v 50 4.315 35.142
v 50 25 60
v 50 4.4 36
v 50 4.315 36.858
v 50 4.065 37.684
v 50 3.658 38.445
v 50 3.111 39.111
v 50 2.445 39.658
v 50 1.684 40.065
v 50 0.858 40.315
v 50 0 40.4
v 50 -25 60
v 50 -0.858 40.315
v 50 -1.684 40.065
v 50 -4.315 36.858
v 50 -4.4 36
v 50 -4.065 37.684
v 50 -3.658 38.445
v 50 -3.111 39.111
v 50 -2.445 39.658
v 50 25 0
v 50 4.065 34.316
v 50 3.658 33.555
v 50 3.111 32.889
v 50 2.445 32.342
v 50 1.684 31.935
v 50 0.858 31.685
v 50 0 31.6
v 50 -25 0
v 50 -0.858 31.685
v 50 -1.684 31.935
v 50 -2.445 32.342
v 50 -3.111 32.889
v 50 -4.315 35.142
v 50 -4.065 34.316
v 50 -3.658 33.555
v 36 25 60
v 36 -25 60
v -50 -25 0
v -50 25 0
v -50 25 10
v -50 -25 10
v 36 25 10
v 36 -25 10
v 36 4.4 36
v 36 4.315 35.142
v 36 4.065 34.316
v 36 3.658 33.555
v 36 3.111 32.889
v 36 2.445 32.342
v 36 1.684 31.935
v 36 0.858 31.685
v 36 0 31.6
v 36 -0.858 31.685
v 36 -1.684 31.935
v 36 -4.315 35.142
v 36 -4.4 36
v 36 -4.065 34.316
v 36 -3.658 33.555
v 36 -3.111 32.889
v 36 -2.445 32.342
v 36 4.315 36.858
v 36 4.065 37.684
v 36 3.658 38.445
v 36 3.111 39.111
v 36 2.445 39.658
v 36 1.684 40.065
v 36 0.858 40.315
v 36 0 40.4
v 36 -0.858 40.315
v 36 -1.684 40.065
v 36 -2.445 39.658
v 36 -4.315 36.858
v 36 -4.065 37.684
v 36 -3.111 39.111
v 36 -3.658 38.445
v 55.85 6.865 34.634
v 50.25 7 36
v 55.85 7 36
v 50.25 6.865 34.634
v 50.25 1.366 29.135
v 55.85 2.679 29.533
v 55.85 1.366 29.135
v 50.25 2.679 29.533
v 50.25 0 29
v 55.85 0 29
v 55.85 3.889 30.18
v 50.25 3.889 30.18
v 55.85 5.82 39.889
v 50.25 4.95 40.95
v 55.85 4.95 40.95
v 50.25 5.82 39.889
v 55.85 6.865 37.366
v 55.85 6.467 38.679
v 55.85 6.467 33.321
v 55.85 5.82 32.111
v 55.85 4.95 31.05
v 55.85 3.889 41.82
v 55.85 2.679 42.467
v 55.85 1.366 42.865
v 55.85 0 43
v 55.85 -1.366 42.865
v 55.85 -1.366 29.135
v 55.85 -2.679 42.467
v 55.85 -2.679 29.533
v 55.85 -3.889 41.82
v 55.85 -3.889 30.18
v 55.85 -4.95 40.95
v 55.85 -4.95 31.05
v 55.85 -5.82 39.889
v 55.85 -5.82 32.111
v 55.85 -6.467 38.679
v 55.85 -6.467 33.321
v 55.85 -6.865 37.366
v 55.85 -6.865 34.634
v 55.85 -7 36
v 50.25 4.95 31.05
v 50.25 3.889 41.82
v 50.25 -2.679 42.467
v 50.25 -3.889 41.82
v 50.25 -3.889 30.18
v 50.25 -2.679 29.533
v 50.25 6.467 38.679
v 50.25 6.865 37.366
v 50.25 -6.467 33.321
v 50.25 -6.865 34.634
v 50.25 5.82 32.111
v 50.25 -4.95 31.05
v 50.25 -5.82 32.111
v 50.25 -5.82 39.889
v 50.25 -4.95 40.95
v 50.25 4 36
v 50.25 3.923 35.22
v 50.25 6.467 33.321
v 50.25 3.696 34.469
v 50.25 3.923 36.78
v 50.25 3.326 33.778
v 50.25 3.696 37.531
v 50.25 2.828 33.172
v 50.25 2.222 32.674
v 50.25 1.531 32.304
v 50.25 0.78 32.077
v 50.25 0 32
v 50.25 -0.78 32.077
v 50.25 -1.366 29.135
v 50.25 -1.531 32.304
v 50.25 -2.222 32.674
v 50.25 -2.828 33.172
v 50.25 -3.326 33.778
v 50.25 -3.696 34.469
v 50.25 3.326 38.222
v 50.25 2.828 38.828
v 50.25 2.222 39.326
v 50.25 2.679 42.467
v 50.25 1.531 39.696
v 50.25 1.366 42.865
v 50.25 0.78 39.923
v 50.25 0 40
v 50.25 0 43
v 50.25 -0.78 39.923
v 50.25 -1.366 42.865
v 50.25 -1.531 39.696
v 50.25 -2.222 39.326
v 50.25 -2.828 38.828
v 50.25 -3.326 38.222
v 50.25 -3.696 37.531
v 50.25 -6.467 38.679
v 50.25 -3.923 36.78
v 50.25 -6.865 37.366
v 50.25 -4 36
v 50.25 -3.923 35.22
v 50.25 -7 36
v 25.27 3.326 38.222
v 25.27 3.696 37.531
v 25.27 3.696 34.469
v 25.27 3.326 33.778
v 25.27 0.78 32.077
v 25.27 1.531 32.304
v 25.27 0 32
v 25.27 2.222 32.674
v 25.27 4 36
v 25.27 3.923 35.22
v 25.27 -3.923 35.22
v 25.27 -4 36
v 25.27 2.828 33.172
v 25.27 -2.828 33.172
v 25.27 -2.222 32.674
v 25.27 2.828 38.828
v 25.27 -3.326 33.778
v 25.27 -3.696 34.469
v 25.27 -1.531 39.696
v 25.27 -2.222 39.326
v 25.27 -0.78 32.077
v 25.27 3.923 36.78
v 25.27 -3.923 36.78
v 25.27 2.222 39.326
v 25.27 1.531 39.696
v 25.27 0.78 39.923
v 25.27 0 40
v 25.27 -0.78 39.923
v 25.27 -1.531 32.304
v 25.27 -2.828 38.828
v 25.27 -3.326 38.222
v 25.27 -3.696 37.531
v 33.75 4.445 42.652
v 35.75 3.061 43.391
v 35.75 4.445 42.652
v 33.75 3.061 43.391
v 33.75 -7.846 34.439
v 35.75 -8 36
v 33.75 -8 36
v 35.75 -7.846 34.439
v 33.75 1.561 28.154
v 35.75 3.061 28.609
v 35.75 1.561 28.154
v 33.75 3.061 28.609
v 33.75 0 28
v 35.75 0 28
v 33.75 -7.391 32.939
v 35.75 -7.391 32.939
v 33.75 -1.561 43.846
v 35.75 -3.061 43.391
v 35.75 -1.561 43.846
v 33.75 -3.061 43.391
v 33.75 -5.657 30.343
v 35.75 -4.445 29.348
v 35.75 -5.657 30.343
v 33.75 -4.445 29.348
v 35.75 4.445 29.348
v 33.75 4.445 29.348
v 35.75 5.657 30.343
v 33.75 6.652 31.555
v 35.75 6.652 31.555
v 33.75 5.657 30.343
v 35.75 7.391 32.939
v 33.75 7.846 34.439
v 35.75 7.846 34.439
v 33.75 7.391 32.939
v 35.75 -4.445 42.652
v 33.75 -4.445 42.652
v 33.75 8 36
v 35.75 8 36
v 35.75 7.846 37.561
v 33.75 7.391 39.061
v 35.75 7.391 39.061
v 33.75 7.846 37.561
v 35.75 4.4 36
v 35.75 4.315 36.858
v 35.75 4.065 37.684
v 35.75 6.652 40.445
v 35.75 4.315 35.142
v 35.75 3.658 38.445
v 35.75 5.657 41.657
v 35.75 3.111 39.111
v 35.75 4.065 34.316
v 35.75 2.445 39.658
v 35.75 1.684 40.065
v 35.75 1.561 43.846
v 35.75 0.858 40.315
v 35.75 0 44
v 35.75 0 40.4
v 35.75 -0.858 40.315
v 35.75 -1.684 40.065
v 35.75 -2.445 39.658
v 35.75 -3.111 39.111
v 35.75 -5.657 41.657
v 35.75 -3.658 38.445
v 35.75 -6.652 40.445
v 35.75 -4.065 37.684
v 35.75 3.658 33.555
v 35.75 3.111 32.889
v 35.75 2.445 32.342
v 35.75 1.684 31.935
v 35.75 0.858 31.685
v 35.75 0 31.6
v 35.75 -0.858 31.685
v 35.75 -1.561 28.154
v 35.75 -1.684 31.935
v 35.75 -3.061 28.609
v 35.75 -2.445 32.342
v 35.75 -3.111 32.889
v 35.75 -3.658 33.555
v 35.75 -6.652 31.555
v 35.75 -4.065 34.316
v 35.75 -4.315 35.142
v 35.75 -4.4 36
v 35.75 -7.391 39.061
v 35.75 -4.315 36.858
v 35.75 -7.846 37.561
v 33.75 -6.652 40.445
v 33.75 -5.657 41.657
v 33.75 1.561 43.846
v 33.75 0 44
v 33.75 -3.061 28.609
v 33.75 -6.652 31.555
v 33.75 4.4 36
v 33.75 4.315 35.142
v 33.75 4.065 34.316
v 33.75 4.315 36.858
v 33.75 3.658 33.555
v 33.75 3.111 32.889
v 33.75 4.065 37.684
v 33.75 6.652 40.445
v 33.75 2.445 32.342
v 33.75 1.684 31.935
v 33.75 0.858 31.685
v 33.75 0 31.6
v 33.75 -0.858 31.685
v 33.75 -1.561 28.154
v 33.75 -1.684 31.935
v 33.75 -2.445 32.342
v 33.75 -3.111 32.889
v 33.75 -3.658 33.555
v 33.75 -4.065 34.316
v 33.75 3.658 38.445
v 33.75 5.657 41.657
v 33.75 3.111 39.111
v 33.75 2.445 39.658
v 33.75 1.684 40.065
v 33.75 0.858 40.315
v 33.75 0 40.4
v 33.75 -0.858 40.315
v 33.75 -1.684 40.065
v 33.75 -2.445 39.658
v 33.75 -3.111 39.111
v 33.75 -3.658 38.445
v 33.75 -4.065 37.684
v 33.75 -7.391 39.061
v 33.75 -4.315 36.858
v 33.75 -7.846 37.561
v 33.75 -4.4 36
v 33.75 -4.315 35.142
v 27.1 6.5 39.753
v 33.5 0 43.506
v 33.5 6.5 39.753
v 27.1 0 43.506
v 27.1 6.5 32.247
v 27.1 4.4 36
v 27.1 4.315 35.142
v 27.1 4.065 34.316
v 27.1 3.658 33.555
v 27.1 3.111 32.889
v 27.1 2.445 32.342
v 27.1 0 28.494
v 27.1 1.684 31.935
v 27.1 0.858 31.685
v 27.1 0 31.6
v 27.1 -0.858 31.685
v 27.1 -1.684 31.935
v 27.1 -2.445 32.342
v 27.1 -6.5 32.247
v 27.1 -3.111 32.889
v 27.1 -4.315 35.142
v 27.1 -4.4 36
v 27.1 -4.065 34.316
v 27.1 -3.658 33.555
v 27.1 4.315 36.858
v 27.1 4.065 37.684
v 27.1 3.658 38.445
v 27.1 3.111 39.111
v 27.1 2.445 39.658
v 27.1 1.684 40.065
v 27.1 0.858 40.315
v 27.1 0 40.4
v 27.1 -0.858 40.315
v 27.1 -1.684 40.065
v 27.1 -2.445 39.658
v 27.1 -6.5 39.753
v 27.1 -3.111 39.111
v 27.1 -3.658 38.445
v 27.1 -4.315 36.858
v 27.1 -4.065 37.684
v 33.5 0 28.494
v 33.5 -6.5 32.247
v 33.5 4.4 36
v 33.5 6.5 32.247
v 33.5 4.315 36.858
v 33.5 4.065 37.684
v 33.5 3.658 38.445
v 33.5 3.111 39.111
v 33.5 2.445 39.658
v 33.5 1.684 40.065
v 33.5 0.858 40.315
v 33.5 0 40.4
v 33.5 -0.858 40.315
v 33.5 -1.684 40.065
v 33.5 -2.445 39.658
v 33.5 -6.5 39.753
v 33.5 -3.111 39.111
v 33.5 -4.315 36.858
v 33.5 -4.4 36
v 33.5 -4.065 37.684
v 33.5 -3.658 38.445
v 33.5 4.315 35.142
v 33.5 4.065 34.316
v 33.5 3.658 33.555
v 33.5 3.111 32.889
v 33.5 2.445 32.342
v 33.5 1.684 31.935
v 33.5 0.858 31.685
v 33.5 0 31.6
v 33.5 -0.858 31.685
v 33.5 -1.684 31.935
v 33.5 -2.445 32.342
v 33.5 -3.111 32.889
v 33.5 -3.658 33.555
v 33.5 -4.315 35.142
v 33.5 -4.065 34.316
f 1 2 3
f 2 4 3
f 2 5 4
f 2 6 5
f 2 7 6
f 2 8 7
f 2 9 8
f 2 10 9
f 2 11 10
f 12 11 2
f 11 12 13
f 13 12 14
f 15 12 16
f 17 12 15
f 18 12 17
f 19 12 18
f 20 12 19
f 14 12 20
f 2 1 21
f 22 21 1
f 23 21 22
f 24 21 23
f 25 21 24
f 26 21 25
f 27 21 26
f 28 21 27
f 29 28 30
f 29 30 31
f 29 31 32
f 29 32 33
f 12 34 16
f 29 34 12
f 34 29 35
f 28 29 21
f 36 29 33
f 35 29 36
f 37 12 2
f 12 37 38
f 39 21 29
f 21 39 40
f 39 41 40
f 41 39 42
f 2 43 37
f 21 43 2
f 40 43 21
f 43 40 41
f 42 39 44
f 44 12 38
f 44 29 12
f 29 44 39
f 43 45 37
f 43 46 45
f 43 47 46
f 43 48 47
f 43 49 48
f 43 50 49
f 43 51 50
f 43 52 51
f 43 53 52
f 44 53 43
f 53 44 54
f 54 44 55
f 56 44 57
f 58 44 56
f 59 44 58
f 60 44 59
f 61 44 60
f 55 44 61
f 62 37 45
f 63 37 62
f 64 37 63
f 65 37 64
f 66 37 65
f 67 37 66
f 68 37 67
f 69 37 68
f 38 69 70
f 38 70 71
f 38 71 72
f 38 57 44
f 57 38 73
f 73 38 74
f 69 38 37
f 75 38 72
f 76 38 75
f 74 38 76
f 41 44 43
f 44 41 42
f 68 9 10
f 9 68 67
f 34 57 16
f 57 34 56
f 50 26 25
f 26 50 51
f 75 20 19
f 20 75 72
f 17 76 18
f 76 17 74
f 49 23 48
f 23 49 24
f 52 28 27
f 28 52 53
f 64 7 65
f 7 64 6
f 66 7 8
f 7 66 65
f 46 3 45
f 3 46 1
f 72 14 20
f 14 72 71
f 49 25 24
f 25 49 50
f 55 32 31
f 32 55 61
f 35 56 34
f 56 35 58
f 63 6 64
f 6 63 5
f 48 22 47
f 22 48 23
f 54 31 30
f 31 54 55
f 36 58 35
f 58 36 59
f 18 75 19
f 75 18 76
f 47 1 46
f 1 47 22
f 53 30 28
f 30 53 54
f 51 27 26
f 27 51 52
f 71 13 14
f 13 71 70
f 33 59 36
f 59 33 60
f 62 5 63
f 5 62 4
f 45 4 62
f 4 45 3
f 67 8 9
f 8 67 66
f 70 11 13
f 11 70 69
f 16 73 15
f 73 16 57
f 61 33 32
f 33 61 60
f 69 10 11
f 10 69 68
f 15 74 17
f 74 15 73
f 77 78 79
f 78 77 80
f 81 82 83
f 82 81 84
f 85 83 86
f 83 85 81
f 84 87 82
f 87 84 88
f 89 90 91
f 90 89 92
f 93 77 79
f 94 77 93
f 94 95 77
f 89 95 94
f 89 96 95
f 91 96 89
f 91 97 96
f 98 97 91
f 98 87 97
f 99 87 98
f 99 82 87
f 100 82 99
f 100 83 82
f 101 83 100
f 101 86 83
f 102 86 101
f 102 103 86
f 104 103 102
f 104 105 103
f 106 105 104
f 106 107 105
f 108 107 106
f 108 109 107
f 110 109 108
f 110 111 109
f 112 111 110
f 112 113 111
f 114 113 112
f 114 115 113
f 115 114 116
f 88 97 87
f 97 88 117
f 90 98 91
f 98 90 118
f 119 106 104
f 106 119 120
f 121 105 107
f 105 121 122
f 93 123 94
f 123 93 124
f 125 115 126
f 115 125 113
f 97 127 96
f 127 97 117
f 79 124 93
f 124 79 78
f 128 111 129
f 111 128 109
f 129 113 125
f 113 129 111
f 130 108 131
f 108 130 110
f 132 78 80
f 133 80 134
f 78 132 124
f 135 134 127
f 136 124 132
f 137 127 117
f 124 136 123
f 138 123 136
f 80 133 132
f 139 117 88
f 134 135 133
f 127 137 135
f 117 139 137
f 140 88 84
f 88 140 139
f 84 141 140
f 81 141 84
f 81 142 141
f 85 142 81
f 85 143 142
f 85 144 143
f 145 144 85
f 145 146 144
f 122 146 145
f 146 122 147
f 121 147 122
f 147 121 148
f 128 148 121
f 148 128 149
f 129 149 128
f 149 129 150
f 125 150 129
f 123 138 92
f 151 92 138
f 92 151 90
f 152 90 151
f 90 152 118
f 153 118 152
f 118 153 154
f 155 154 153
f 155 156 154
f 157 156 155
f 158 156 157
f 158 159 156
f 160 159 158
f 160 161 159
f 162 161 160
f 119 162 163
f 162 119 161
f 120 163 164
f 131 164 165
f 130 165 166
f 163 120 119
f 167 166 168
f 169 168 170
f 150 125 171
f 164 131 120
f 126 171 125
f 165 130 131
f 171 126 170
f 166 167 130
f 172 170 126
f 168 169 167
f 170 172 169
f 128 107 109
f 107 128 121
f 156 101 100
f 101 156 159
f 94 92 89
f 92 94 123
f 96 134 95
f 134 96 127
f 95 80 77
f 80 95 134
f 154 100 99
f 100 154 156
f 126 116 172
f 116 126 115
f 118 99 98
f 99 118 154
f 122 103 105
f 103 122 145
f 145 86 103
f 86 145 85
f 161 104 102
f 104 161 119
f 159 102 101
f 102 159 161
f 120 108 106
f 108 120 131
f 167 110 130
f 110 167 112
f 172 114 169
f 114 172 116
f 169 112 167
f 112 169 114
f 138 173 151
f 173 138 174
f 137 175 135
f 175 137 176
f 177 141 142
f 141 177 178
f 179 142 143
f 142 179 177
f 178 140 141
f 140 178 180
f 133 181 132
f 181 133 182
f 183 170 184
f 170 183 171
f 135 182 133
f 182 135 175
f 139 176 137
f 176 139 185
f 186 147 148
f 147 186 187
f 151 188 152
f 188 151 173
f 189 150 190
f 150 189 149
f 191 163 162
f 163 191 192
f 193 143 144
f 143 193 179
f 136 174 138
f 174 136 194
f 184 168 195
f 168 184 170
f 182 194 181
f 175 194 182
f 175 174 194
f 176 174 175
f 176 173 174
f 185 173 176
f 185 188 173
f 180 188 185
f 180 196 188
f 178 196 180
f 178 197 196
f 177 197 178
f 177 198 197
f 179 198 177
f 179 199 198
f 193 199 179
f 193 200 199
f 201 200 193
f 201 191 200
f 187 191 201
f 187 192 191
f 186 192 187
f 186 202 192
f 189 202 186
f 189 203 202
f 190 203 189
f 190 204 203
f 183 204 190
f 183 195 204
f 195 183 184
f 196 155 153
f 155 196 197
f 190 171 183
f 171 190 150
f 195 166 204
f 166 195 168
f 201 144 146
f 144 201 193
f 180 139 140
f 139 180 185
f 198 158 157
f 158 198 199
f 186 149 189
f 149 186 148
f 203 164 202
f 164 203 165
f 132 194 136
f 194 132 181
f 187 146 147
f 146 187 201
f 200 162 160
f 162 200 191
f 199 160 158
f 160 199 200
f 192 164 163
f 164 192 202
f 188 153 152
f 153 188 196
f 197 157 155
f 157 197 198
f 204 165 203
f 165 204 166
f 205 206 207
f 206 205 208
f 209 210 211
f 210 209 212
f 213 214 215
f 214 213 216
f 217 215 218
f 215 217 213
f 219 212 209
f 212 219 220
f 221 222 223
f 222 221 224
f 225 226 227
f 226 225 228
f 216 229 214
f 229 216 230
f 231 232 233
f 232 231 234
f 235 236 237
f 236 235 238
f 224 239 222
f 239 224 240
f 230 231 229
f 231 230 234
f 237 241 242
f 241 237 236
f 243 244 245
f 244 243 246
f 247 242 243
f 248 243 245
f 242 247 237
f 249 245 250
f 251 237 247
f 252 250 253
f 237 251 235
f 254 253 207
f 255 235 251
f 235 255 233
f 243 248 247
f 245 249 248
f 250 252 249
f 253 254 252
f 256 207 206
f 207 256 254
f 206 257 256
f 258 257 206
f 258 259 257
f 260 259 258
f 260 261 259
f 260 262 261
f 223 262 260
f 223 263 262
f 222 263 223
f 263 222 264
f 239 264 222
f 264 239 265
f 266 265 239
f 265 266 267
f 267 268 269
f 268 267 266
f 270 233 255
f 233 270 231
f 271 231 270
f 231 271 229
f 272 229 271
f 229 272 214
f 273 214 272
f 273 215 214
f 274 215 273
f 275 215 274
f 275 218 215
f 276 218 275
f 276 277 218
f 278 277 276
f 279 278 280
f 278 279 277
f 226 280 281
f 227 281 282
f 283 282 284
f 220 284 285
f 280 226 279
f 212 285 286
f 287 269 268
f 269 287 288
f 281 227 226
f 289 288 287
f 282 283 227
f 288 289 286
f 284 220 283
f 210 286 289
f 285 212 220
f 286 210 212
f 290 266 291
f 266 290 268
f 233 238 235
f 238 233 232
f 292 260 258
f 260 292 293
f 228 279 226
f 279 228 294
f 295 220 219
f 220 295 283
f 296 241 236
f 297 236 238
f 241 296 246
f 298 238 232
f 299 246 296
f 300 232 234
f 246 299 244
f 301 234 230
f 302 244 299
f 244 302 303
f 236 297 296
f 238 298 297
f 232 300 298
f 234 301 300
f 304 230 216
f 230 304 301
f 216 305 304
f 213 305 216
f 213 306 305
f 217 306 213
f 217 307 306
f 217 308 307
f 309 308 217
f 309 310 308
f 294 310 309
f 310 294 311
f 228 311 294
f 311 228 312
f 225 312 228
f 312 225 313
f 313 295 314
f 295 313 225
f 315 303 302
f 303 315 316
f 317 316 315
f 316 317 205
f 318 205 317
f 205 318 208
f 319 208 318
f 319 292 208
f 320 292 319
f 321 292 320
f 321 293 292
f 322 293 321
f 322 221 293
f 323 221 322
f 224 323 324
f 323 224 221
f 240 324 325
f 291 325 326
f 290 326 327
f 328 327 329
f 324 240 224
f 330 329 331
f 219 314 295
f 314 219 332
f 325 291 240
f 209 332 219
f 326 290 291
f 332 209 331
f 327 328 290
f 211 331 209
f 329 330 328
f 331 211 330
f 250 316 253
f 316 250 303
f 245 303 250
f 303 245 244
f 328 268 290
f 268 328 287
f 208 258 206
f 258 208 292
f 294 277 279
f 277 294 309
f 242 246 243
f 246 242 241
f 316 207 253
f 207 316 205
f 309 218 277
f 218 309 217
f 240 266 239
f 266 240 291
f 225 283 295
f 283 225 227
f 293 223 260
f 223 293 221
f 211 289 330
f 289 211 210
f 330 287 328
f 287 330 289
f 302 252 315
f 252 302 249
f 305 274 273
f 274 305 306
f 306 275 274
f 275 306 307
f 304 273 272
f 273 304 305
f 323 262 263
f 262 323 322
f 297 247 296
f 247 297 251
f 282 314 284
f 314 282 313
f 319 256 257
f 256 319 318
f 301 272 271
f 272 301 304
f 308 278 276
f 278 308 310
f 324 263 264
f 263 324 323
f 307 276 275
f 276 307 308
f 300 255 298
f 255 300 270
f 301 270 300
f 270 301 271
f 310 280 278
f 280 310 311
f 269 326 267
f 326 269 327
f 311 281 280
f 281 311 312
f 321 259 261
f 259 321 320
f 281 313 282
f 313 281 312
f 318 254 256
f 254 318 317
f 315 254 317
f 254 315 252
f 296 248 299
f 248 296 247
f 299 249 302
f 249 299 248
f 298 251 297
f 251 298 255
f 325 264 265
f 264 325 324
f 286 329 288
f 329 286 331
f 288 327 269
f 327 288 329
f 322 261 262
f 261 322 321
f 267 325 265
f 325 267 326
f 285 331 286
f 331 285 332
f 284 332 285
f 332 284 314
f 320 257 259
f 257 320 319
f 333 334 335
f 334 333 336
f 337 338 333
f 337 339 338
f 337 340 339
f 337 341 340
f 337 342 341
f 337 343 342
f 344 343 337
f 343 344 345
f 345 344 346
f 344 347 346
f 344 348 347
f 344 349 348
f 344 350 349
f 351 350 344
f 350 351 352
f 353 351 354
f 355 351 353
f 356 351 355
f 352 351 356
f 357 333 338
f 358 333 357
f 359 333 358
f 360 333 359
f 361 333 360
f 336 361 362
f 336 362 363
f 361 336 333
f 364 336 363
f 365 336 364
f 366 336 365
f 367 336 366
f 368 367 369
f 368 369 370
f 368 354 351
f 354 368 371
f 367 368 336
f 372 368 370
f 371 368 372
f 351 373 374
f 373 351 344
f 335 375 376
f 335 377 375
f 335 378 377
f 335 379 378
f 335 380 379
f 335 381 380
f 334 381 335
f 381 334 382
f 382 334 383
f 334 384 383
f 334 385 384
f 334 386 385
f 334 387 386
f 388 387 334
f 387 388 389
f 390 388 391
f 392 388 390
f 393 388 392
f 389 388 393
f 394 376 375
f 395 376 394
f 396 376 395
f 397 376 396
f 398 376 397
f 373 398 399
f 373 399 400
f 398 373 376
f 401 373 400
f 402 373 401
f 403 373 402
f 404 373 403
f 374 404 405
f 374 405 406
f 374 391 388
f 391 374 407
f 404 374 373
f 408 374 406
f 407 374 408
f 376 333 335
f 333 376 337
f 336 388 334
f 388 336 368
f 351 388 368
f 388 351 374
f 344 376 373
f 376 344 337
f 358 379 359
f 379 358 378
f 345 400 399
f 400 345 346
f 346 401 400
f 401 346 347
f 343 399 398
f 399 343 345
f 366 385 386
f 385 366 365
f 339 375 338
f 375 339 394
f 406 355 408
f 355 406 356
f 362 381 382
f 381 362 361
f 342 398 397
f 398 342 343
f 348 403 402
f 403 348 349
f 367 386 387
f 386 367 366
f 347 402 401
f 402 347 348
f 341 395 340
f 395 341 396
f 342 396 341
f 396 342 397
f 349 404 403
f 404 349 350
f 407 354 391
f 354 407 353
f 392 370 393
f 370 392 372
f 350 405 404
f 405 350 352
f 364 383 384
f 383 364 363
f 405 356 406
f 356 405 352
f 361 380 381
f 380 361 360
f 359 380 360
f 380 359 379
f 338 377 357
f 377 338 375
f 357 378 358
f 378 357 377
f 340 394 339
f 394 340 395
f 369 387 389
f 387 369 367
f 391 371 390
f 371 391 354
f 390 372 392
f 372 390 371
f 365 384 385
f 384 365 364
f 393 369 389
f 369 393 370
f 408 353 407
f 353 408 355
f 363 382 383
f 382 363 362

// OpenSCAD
$fn = 32;

// ------------------------------------------------------------------------
// Bolted bracket: 100 x 50 mm bracket with 1 bolt joints
// Every part is its own module, assembly() places them once.
// ------------------------------------------------------------------------

// --- part 1 ---
module bracket() {
  difference() {
    translate([-50, -25, 0]) cube([100, 50, 60]);
    translate([-51, -26, 10]) cube([87, 52, 51]);
    translate([43, 0, 36]) rotate([0, 90, 0]) cylinder(h = 16, d = 8.8, center = true);
  }
}

// --- part 2 ---
module bolt() {
  cylinder(h = 5.6, d = 14);
  translate([0, 0, -24.98]) cylinder(h = 24.98, d = 8);
}

// --- part 3 ---
module washer() {
  difference() {
      translate([0, 0, 0]) cylinder(h = 2, d = 16);
      translate([0, 0, -1]) cylinder(h = 4, d = 8.8);
    }
}

// --- part 4 ---
module nut() {
  difference() {
    linear_extrude(height = 6.4) polygon(points = [[7.506, 0], [3.753, 6.5], [-3.753, 6.5], [-7.506, 0], [-3.753, -6.5], [3.753, -6.5]]);
    translate([0, 0, -1]) cylinder(h = 8.4, d = 8.8);
  }
}

// --- assembly ---
module assembly() {
  translate([0, 0, 0]) rotate([0, 0, 0]) bracket();
  translate([50.25, 0, 36]) rotate([0, 90, 0]) bolt();
  translate([33.75, 0, 36]) rotate([0, 90, 0]) washer();
  translate([27.1, 0, 36]) rotate([0, 90, 0]) nut();
}

assembly();
